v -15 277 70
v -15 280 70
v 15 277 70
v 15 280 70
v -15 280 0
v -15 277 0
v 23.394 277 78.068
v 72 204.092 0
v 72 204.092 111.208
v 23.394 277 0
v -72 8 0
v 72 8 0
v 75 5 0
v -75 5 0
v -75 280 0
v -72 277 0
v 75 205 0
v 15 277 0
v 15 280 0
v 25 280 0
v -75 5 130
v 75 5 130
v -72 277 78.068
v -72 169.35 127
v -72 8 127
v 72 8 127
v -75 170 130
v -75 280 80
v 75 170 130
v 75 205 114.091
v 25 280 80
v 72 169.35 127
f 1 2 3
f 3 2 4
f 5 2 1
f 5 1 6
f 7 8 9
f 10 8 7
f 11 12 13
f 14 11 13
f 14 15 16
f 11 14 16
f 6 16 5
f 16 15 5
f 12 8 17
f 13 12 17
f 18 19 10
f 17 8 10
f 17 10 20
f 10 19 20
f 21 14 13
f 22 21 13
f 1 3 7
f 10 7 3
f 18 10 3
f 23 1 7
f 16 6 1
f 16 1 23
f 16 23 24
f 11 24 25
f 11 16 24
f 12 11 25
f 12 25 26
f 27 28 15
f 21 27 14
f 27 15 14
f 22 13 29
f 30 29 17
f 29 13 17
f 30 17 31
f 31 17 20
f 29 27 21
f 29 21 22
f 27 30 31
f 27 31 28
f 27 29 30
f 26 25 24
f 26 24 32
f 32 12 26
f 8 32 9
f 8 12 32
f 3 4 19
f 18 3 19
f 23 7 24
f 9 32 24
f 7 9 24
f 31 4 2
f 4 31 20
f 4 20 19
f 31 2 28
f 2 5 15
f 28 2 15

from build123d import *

# Parameters (mm, degrees)
EXTRUDE_1_DEPTH     = 130
CHAMFER_1_SIZE      = 50
CHAMFER_1_SIZE2     = 110
SHELL_1_T           = -3
SKETCH_3_W          = 30
SKETCH_3_H          = 70
CUT_EXTRUDE_1_DEPTH = 3


with BuildPart() as part:
    # 草图2 → 凸台-拉伸1 (new body)
    with BuildSketch(Plane.XY):
        Polygon((-75, 280), (-75, 5), (75, 5), (75, 205), (25, 280), align=None)
    extrude(amount=EXTRUDE_1_DEPTH)

    # 倒角1
    chamfer_1_edges = [part.edges().sort_by_distance(p)[0] for p in [
        (-25, 280, 130),
    ]]
    chamfer_1_side = [part.faces().sort_by_distance(p)[0] for p in [
        (-25, 280, 65),
    ]]
    chamfer(chamfer_1_edges, length=CHAMFER_1_SIZE, length2=CHAMFER_1_SIZE2, reference=chamfer_1_side[0])

    # 抽壳1
    shell_1_openings = [part.faces().sort_by_distance(p)[0] for p in [
        (-2.777777778, 137.142857143, 0),
    ]]
    offset(amount=SHELL_1_T, openings=shell_1_openings, kind=Kind.INTERSECTION)

    # 草图3 → 切除-拉伸1 (cut)
    with BuildSketch(Plane(origin=(0, 280, 0), x_dir=(1, 0, 0), z_dir=(0, 1, 0))):
        with Locations((0, -35)):
            Rectangle(SKETCH_3_W, SKETCH_3_H)
    extrude(amount=-CUT_EXTRUDE_1_DEPTH, mode=Mode.SUBTRACT)


solid = part.part
